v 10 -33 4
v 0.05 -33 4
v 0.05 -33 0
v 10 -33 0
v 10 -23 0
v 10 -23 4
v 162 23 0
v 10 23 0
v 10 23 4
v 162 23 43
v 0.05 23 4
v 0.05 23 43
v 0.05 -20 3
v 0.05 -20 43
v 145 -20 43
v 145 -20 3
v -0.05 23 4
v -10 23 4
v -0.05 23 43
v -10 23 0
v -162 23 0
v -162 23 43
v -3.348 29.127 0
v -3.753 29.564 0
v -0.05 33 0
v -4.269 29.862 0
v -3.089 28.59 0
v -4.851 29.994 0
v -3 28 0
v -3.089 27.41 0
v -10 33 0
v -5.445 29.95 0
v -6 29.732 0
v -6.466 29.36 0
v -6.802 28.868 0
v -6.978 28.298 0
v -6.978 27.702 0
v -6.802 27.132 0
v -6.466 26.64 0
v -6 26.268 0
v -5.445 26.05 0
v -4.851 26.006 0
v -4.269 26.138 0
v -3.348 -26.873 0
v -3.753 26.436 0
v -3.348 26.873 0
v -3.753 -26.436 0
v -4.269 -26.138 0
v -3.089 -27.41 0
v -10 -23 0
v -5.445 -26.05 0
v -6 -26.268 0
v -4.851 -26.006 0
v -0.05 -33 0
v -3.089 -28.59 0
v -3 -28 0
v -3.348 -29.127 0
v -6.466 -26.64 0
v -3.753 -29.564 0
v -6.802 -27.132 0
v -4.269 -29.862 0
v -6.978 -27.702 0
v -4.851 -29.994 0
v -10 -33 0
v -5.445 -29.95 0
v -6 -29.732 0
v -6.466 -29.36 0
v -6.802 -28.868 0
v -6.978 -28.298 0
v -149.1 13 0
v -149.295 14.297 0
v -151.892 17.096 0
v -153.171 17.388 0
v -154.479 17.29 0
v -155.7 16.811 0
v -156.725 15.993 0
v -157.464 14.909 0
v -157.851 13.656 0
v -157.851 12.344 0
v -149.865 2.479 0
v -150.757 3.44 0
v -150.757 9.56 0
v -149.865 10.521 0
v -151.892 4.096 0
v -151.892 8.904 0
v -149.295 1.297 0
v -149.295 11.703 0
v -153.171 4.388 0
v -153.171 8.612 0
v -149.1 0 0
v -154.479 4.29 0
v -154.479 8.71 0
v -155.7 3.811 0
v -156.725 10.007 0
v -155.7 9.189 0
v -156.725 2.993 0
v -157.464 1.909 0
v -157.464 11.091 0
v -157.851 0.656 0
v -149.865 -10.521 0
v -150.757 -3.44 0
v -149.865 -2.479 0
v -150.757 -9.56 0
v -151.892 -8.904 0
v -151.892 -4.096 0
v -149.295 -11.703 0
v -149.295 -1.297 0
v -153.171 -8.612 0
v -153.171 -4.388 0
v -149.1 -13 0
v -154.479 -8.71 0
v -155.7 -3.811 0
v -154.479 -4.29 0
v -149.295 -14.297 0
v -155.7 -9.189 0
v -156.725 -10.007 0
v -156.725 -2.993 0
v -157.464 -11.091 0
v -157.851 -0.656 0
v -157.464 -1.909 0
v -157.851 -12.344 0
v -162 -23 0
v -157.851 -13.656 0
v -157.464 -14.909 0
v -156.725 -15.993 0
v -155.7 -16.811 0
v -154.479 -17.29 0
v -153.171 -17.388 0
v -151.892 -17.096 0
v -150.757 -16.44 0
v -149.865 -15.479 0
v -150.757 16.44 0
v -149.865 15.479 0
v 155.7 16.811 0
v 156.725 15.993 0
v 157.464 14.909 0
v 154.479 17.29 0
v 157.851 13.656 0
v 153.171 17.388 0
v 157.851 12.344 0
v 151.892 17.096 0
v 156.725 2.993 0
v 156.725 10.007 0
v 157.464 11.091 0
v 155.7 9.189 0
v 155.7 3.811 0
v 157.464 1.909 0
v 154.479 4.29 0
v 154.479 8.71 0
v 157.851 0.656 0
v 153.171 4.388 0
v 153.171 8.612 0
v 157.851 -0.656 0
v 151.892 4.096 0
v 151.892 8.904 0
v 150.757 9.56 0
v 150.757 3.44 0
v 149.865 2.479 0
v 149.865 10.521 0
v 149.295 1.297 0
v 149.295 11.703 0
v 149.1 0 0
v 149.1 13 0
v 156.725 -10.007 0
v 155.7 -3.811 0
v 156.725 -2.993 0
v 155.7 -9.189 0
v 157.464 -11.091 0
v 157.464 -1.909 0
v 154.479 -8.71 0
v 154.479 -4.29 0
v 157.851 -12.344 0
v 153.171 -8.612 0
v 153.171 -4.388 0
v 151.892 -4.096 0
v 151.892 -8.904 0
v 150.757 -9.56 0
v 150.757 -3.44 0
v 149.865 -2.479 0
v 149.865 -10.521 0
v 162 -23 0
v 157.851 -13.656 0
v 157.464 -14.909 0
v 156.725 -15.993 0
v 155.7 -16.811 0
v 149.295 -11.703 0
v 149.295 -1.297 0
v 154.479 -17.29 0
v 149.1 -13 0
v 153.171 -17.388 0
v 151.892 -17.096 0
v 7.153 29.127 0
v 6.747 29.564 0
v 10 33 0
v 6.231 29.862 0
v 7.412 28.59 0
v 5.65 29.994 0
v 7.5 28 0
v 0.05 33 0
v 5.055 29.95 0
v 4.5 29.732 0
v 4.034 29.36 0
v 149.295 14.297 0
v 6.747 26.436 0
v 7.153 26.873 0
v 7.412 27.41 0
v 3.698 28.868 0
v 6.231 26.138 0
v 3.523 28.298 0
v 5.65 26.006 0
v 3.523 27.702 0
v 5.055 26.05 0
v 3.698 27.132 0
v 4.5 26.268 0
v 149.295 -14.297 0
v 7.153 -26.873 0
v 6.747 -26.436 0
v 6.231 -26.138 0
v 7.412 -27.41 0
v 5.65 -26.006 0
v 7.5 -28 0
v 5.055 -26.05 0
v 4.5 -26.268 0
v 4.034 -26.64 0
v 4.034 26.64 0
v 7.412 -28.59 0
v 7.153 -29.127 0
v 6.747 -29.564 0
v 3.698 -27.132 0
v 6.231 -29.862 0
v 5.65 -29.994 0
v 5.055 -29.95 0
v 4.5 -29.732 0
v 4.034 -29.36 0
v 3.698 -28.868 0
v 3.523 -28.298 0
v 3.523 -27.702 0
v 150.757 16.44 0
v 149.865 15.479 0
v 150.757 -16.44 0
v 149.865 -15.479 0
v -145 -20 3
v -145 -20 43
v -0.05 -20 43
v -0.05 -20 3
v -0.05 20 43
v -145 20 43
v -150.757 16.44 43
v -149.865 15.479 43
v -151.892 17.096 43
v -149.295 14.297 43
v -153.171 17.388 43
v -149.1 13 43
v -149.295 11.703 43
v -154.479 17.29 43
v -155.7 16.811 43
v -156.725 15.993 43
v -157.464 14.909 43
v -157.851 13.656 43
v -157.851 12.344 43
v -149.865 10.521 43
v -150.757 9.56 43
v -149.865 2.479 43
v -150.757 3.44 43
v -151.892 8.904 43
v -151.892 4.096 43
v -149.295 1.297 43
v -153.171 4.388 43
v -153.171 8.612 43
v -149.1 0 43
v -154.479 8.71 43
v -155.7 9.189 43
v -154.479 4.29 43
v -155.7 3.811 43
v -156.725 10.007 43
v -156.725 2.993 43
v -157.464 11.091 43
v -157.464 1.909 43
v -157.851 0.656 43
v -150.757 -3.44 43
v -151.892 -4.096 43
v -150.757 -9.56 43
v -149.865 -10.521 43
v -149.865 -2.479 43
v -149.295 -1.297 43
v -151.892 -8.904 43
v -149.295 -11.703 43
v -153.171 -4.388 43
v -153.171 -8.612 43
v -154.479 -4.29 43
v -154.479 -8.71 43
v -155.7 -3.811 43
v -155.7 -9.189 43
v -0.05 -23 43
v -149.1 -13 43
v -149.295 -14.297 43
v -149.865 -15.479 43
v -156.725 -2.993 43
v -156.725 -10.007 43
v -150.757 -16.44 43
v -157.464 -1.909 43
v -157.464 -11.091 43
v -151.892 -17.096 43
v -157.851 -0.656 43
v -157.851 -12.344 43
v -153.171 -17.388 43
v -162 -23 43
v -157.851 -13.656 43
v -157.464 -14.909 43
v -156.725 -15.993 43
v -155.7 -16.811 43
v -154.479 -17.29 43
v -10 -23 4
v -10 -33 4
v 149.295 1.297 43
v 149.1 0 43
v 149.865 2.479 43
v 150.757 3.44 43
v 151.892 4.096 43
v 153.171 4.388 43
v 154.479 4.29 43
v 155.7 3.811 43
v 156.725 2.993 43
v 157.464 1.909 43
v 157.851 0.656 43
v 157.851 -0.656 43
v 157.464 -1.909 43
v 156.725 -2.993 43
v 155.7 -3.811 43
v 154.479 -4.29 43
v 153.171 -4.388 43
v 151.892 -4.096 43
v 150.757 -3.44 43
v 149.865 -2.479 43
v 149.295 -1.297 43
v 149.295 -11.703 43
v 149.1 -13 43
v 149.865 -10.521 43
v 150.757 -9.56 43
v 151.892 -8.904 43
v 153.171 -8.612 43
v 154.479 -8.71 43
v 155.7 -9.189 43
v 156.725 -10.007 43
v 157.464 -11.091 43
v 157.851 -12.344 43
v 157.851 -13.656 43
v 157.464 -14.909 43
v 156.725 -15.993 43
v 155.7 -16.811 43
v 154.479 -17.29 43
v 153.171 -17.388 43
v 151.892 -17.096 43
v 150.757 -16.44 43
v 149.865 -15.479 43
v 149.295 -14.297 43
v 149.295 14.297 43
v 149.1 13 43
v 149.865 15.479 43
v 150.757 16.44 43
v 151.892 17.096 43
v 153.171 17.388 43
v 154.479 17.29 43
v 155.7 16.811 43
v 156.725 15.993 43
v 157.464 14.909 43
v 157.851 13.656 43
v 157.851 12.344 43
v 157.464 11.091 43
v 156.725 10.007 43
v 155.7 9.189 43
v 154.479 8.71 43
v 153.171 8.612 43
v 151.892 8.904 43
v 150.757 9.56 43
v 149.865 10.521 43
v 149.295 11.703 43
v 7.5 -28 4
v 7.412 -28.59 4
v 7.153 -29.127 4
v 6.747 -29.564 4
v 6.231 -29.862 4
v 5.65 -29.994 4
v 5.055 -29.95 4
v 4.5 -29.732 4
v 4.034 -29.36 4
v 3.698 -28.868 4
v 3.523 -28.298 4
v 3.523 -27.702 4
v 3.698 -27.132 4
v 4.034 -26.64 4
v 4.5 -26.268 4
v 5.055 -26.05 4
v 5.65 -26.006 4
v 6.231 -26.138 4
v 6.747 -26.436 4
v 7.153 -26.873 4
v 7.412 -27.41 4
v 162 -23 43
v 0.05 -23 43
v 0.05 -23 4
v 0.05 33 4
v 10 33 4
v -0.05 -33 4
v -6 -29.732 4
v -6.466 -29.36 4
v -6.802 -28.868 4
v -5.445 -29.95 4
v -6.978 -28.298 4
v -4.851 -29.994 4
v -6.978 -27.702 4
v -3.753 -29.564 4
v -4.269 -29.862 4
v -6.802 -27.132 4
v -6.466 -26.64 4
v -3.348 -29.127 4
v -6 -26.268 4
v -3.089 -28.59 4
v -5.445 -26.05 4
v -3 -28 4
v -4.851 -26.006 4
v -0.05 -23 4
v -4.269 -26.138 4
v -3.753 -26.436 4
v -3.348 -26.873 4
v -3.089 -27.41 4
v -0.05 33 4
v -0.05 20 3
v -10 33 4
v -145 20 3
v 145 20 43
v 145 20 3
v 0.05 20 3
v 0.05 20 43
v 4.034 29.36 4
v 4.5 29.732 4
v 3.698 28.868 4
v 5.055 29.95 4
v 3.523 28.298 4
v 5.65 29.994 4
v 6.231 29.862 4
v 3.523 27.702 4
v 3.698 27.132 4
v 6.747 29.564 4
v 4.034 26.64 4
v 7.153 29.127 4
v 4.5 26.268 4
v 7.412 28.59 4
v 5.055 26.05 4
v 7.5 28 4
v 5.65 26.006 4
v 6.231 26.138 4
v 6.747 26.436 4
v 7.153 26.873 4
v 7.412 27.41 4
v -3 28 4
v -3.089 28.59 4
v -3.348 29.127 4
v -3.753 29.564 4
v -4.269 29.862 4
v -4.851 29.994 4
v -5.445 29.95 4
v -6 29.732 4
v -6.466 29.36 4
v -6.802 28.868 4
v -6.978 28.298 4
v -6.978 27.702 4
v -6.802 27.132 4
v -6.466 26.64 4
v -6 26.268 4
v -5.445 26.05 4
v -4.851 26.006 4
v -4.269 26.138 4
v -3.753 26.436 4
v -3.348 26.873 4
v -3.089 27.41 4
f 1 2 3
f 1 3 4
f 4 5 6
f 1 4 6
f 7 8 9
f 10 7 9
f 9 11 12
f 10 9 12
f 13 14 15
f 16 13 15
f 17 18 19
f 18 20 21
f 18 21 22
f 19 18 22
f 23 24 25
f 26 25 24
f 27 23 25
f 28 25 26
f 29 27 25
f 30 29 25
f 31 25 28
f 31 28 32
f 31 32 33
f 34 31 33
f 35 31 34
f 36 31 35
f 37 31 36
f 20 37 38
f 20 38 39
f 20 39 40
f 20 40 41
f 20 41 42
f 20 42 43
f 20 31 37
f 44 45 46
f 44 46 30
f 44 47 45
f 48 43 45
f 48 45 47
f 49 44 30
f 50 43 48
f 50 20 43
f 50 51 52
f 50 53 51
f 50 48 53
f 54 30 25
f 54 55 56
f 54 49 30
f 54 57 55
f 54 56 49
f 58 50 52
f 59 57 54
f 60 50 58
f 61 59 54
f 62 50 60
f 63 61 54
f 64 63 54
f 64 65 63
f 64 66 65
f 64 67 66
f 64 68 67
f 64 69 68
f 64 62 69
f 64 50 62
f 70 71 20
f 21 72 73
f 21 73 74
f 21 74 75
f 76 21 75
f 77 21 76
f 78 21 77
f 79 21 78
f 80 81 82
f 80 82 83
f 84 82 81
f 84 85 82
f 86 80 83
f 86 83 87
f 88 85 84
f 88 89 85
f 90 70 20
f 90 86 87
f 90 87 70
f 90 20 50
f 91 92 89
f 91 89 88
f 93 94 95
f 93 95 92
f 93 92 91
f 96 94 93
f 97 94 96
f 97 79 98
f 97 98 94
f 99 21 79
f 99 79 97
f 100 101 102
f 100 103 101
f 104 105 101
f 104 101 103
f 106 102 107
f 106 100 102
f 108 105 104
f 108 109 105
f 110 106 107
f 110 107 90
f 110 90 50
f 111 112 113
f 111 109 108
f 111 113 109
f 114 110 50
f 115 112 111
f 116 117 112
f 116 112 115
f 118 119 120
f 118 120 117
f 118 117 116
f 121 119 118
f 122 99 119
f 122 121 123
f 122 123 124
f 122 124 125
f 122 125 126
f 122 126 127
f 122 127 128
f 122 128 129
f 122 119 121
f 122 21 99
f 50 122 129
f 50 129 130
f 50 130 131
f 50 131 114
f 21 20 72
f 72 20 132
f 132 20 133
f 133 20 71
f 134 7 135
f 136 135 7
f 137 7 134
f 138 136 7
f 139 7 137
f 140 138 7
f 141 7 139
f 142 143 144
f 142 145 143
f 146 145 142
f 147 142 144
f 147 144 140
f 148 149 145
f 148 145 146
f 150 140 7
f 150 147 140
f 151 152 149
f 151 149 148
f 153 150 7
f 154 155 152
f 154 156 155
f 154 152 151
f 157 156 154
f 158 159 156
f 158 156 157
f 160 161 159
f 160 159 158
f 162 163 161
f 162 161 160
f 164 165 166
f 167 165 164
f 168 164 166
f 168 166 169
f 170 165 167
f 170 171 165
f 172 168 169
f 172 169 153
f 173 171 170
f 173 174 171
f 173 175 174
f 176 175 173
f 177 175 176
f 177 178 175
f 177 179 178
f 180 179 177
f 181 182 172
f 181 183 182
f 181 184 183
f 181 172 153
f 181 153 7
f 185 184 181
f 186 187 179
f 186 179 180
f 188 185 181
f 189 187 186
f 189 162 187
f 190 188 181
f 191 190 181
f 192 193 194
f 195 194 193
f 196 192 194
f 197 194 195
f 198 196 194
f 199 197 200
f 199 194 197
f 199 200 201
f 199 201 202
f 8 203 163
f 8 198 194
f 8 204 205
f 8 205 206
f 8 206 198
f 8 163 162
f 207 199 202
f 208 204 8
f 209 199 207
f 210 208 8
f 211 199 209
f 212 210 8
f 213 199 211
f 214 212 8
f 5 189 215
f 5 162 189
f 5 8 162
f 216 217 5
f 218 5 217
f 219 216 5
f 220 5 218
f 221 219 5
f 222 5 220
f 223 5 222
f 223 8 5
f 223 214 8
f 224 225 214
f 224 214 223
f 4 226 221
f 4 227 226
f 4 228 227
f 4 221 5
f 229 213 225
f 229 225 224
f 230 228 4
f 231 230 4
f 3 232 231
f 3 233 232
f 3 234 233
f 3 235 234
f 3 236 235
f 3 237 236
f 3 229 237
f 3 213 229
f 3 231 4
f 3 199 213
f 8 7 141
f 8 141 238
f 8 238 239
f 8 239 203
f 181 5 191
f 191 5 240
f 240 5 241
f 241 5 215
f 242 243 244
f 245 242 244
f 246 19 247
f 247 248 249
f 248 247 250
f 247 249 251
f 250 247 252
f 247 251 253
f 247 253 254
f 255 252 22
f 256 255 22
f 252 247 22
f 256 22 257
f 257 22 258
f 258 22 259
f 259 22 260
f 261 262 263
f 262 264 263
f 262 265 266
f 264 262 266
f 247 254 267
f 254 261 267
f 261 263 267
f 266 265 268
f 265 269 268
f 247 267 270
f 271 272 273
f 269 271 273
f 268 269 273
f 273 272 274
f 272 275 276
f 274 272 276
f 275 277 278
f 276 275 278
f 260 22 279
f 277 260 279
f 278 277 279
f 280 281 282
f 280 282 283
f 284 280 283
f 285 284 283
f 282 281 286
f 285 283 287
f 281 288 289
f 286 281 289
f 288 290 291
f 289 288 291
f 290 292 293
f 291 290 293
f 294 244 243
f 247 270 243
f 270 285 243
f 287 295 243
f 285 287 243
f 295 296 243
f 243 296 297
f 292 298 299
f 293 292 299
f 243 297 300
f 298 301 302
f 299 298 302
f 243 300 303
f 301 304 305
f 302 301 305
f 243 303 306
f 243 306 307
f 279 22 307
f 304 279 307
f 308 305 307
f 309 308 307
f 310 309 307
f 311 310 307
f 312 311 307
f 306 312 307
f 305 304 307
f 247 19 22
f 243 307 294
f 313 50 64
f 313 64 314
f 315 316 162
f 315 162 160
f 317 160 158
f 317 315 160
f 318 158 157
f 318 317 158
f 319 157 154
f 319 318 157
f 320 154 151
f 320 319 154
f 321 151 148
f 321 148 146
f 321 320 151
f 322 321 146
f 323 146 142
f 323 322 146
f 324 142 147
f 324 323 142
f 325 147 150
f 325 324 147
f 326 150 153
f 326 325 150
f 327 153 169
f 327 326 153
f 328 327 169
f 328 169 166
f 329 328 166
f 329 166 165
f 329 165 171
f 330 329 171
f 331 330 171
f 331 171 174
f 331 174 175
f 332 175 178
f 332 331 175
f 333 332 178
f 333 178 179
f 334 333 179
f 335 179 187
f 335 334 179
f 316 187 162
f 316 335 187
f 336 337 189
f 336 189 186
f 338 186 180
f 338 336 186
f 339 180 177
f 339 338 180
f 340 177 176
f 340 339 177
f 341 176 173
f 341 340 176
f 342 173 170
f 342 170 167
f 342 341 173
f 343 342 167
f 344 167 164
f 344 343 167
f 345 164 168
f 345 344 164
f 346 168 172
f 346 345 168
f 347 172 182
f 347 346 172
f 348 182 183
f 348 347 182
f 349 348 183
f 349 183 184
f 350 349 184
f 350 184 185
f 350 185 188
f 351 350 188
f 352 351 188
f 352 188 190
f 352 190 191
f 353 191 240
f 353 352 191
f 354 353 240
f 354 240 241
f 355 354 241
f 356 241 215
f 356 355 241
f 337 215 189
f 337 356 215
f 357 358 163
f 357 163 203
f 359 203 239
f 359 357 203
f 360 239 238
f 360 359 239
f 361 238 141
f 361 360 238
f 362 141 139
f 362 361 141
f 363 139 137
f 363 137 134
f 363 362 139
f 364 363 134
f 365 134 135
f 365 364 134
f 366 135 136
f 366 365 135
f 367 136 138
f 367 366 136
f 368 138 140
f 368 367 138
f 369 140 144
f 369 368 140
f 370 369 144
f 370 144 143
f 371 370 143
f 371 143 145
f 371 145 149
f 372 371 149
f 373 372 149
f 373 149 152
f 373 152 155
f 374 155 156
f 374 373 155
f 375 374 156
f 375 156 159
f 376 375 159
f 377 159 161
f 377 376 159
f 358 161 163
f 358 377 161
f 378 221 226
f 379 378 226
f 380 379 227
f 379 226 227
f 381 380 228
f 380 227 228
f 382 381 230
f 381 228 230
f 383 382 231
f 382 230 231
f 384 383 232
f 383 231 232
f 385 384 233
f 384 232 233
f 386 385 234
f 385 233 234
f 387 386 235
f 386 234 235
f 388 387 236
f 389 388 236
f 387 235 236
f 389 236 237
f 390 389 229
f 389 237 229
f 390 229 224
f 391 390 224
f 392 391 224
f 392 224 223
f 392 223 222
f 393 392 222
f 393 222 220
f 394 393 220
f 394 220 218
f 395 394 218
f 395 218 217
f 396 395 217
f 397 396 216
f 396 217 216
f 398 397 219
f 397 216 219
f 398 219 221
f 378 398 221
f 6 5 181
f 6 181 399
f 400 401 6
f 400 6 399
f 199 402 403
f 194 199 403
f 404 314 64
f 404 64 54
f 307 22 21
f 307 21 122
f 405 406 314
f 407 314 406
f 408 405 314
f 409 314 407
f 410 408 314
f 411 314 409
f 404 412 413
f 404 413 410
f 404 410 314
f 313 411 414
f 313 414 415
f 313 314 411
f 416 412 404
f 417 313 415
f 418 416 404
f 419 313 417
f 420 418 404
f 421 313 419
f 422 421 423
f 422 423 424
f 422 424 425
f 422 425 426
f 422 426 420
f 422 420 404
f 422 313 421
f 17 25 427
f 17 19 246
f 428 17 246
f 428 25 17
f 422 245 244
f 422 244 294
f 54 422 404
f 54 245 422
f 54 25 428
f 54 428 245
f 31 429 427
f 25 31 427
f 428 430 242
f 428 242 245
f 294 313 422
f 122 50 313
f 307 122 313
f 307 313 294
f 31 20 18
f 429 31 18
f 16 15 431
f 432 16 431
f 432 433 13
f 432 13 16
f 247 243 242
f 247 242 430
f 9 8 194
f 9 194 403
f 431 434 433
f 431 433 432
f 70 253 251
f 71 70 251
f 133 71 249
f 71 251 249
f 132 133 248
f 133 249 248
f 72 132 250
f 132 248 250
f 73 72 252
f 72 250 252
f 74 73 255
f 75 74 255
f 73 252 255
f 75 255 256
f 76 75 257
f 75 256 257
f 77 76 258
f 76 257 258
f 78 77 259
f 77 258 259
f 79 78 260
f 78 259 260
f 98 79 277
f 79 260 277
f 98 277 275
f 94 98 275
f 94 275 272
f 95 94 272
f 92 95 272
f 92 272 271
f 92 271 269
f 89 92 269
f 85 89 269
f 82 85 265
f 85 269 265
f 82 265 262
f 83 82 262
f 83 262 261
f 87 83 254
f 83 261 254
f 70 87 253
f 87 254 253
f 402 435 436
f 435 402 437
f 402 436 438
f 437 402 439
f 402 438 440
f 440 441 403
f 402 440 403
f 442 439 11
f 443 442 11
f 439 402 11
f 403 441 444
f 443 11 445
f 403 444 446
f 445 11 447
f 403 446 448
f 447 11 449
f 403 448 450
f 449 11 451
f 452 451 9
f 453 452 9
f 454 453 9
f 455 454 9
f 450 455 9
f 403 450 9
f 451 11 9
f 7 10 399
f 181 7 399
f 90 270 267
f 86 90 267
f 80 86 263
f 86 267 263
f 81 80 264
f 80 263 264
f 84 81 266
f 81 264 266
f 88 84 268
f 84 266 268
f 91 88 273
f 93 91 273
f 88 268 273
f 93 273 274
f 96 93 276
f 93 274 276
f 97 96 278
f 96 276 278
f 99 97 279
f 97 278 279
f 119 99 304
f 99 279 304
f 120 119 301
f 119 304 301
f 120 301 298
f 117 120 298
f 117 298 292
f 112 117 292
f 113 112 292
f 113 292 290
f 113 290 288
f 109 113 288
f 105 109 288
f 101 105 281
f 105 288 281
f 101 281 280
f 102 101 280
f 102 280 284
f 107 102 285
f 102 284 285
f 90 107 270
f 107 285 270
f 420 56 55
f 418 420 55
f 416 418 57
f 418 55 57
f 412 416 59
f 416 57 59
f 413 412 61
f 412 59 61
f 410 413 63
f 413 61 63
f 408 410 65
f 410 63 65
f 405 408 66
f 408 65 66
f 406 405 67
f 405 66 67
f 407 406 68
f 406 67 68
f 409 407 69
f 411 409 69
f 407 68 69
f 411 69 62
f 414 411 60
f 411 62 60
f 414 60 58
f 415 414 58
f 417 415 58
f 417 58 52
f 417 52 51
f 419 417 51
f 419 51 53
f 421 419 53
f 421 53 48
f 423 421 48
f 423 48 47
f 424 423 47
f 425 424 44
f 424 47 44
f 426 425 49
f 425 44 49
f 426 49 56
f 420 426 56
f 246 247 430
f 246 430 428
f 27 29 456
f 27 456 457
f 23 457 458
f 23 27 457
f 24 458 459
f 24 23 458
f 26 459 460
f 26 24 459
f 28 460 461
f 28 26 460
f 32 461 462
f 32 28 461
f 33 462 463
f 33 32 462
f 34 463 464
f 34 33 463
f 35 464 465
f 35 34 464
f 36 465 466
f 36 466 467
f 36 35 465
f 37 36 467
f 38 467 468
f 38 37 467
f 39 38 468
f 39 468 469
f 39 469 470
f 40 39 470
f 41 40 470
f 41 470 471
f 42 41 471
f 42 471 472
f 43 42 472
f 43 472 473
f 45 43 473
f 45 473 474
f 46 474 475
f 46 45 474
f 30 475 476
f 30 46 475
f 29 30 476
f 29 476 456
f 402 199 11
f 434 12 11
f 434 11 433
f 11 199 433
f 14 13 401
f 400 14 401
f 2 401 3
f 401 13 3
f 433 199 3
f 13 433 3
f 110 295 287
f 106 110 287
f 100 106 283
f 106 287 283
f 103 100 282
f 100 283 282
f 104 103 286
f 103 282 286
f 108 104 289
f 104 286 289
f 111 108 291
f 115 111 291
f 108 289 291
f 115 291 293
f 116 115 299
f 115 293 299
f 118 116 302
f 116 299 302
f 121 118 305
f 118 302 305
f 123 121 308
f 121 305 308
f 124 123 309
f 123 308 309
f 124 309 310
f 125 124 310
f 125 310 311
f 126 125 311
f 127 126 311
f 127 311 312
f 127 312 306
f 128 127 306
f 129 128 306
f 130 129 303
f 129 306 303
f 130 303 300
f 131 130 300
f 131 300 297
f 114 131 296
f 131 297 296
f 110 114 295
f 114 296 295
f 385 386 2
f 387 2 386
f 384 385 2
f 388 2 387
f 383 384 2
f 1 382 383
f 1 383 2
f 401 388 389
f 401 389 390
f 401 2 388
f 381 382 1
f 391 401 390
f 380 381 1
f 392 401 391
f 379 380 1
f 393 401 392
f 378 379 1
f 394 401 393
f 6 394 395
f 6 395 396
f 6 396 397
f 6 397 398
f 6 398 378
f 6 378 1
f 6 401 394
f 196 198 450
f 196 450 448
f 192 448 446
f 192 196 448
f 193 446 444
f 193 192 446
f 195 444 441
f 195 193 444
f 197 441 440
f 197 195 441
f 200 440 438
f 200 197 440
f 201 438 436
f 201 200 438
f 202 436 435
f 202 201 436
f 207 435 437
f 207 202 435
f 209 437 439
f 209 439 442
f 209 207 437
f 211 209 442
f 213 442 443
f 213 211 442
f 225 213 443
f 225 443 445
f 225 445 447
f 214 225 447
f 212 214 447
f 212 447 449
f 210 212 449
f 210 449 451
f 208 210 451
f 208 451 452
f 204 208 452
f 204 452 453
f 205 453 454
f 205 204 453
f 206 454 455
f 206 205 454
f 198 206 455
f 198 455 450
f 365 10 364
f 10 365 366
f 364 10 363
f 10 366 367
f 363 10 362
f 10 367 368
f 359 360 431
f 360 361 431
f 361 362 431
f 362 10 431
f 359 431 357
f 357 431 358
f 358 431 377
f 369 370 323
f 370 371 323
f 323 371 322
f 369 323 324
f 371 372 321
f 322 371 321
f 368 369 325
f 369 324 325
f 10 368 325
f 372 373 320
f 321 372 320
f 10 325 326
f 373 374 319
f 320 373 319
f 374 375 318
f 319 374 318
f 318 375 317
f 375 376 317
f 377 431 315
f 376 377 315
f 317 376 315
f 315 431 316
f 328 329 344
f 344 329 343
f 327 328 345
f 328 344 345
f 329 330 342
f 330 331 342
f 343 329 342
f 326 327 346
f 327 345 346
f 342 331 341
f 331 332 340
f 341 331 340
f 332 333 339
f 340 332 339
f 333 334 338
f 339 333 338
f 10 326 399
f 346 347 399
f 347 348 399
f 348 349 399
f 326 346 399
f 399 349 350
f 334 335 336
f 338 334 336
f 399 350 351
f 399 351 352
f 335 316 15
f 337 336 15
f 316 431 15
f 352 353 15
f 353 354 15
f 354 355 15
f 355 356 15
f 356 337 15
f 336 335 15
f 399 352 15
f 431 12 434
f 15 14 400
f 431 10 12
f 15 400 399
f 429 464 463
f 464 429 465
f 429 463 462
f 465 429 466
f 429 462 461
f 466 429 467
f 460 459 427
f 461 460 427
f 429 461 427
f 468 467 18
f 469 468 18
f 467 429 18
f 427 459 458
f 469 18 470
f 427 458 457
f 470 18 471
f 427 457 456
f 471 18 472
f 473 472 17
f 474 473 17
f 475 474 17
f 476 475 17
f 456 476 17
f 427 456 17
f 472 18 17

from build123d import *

# Parameters (mm, degrees)
F0_W      = 296
F0_H      = 46
F1_DEPTH  = 43
F2_W      = 290
F2_H      = 40
F3_DEPTH  = 40
F4_W      = 46
F4_H      = 43
F5_DEPTH  = 14
F6_R      = 4.4
F7_DEPTH  = 43
F9_W      = 20
F9_H      = 4
F10_DEPTH = 10
F11_R     = 2
F12_DEPTH = 4
F14_W     = 0.1
F14_H     = 66
F15_DEPTH = 43


with BuildPart() as f1:
    # F0 (on Top) → F1 (new body)
    with BuildSketch(Plane.XY):
        Rectangle(F0_W, F0_H)
    extrude(amount=F1_DEPTH)

    # F2 (on face) → F3 (cut)
    with BuildSketch(Plane.XY.offset(43)):
        Rectangle(F2_W, F2_H)
    extrude(amount=-F3_DEPTH, mode=Mode.SUBTRACT)

    # F4 (on face) → F5 (join)
    with BuildSketch(Plane(origin=(-148, 0, 0), x_dir=(0, -1, 0), z_dir=(-1, 0, 0))):
        with Locations((0, 21.5)):
            Rectangle(F4_W, F4_H)
    extrude(amount=F5_DEPTH)

    # F6 (on face) → F7 (cut)
    with BuildSketch(Plane.XY.offset(43)):
        with Locations((-153.5, 0)):
            Circle(F6_R)
        with Locations((-153.5, 13)):
            Circle(F6_R)
        with Locations((-153.5, -13)):
            Circle(F6_R)
    extrude(amount=-F7_DEPTH, mode=Mode.SUBTRACT)

    # F8: F1 across plane


with BuildPart() as f1_1:
    add(f1.part)
    add(f1.part.mirror(Plane.YZ))

    # F9 (on face) → F10 (join)
    with BuildSketch(Plane.XZ.offset(23)):
        with Locations((0, 2)):
            Rectangle(F9_W, F9_H)
    extrude(amount=F10_DEPTH)

    # F11 (on face) → F12 (cut)
    with BuildSketch(Plane(origin=(0, 0, 0), x_dir=(1, 0, 0), z_dir=(0, 0, -1))):
        with Locations((-5, 28)):
            Circle(F11_R)
        with Locations((5.500437, 28)):
            Circle(F11_R)
    extrude(amount=-F12_DEPTH, mode=Mode.SUBTRACT)

    # F13: F1 across plane


with BuildPart() as f1_2:
    add(f1_1.part)
    add(f1_1.part.mirror(Plane.XZ))

    # F14 (on face) → F15 (cut)
    with BuildSketch(Plane(origin=(0, 0, 0), x_dir=(1, 0, 0), z_dir=(0, 0, -1))):
        Rectangle(F14_W, F14_H)
    extrude(amount=-F15_DEPTH, mode=Mode.SUBTRACT)


solid = f1_2.part
